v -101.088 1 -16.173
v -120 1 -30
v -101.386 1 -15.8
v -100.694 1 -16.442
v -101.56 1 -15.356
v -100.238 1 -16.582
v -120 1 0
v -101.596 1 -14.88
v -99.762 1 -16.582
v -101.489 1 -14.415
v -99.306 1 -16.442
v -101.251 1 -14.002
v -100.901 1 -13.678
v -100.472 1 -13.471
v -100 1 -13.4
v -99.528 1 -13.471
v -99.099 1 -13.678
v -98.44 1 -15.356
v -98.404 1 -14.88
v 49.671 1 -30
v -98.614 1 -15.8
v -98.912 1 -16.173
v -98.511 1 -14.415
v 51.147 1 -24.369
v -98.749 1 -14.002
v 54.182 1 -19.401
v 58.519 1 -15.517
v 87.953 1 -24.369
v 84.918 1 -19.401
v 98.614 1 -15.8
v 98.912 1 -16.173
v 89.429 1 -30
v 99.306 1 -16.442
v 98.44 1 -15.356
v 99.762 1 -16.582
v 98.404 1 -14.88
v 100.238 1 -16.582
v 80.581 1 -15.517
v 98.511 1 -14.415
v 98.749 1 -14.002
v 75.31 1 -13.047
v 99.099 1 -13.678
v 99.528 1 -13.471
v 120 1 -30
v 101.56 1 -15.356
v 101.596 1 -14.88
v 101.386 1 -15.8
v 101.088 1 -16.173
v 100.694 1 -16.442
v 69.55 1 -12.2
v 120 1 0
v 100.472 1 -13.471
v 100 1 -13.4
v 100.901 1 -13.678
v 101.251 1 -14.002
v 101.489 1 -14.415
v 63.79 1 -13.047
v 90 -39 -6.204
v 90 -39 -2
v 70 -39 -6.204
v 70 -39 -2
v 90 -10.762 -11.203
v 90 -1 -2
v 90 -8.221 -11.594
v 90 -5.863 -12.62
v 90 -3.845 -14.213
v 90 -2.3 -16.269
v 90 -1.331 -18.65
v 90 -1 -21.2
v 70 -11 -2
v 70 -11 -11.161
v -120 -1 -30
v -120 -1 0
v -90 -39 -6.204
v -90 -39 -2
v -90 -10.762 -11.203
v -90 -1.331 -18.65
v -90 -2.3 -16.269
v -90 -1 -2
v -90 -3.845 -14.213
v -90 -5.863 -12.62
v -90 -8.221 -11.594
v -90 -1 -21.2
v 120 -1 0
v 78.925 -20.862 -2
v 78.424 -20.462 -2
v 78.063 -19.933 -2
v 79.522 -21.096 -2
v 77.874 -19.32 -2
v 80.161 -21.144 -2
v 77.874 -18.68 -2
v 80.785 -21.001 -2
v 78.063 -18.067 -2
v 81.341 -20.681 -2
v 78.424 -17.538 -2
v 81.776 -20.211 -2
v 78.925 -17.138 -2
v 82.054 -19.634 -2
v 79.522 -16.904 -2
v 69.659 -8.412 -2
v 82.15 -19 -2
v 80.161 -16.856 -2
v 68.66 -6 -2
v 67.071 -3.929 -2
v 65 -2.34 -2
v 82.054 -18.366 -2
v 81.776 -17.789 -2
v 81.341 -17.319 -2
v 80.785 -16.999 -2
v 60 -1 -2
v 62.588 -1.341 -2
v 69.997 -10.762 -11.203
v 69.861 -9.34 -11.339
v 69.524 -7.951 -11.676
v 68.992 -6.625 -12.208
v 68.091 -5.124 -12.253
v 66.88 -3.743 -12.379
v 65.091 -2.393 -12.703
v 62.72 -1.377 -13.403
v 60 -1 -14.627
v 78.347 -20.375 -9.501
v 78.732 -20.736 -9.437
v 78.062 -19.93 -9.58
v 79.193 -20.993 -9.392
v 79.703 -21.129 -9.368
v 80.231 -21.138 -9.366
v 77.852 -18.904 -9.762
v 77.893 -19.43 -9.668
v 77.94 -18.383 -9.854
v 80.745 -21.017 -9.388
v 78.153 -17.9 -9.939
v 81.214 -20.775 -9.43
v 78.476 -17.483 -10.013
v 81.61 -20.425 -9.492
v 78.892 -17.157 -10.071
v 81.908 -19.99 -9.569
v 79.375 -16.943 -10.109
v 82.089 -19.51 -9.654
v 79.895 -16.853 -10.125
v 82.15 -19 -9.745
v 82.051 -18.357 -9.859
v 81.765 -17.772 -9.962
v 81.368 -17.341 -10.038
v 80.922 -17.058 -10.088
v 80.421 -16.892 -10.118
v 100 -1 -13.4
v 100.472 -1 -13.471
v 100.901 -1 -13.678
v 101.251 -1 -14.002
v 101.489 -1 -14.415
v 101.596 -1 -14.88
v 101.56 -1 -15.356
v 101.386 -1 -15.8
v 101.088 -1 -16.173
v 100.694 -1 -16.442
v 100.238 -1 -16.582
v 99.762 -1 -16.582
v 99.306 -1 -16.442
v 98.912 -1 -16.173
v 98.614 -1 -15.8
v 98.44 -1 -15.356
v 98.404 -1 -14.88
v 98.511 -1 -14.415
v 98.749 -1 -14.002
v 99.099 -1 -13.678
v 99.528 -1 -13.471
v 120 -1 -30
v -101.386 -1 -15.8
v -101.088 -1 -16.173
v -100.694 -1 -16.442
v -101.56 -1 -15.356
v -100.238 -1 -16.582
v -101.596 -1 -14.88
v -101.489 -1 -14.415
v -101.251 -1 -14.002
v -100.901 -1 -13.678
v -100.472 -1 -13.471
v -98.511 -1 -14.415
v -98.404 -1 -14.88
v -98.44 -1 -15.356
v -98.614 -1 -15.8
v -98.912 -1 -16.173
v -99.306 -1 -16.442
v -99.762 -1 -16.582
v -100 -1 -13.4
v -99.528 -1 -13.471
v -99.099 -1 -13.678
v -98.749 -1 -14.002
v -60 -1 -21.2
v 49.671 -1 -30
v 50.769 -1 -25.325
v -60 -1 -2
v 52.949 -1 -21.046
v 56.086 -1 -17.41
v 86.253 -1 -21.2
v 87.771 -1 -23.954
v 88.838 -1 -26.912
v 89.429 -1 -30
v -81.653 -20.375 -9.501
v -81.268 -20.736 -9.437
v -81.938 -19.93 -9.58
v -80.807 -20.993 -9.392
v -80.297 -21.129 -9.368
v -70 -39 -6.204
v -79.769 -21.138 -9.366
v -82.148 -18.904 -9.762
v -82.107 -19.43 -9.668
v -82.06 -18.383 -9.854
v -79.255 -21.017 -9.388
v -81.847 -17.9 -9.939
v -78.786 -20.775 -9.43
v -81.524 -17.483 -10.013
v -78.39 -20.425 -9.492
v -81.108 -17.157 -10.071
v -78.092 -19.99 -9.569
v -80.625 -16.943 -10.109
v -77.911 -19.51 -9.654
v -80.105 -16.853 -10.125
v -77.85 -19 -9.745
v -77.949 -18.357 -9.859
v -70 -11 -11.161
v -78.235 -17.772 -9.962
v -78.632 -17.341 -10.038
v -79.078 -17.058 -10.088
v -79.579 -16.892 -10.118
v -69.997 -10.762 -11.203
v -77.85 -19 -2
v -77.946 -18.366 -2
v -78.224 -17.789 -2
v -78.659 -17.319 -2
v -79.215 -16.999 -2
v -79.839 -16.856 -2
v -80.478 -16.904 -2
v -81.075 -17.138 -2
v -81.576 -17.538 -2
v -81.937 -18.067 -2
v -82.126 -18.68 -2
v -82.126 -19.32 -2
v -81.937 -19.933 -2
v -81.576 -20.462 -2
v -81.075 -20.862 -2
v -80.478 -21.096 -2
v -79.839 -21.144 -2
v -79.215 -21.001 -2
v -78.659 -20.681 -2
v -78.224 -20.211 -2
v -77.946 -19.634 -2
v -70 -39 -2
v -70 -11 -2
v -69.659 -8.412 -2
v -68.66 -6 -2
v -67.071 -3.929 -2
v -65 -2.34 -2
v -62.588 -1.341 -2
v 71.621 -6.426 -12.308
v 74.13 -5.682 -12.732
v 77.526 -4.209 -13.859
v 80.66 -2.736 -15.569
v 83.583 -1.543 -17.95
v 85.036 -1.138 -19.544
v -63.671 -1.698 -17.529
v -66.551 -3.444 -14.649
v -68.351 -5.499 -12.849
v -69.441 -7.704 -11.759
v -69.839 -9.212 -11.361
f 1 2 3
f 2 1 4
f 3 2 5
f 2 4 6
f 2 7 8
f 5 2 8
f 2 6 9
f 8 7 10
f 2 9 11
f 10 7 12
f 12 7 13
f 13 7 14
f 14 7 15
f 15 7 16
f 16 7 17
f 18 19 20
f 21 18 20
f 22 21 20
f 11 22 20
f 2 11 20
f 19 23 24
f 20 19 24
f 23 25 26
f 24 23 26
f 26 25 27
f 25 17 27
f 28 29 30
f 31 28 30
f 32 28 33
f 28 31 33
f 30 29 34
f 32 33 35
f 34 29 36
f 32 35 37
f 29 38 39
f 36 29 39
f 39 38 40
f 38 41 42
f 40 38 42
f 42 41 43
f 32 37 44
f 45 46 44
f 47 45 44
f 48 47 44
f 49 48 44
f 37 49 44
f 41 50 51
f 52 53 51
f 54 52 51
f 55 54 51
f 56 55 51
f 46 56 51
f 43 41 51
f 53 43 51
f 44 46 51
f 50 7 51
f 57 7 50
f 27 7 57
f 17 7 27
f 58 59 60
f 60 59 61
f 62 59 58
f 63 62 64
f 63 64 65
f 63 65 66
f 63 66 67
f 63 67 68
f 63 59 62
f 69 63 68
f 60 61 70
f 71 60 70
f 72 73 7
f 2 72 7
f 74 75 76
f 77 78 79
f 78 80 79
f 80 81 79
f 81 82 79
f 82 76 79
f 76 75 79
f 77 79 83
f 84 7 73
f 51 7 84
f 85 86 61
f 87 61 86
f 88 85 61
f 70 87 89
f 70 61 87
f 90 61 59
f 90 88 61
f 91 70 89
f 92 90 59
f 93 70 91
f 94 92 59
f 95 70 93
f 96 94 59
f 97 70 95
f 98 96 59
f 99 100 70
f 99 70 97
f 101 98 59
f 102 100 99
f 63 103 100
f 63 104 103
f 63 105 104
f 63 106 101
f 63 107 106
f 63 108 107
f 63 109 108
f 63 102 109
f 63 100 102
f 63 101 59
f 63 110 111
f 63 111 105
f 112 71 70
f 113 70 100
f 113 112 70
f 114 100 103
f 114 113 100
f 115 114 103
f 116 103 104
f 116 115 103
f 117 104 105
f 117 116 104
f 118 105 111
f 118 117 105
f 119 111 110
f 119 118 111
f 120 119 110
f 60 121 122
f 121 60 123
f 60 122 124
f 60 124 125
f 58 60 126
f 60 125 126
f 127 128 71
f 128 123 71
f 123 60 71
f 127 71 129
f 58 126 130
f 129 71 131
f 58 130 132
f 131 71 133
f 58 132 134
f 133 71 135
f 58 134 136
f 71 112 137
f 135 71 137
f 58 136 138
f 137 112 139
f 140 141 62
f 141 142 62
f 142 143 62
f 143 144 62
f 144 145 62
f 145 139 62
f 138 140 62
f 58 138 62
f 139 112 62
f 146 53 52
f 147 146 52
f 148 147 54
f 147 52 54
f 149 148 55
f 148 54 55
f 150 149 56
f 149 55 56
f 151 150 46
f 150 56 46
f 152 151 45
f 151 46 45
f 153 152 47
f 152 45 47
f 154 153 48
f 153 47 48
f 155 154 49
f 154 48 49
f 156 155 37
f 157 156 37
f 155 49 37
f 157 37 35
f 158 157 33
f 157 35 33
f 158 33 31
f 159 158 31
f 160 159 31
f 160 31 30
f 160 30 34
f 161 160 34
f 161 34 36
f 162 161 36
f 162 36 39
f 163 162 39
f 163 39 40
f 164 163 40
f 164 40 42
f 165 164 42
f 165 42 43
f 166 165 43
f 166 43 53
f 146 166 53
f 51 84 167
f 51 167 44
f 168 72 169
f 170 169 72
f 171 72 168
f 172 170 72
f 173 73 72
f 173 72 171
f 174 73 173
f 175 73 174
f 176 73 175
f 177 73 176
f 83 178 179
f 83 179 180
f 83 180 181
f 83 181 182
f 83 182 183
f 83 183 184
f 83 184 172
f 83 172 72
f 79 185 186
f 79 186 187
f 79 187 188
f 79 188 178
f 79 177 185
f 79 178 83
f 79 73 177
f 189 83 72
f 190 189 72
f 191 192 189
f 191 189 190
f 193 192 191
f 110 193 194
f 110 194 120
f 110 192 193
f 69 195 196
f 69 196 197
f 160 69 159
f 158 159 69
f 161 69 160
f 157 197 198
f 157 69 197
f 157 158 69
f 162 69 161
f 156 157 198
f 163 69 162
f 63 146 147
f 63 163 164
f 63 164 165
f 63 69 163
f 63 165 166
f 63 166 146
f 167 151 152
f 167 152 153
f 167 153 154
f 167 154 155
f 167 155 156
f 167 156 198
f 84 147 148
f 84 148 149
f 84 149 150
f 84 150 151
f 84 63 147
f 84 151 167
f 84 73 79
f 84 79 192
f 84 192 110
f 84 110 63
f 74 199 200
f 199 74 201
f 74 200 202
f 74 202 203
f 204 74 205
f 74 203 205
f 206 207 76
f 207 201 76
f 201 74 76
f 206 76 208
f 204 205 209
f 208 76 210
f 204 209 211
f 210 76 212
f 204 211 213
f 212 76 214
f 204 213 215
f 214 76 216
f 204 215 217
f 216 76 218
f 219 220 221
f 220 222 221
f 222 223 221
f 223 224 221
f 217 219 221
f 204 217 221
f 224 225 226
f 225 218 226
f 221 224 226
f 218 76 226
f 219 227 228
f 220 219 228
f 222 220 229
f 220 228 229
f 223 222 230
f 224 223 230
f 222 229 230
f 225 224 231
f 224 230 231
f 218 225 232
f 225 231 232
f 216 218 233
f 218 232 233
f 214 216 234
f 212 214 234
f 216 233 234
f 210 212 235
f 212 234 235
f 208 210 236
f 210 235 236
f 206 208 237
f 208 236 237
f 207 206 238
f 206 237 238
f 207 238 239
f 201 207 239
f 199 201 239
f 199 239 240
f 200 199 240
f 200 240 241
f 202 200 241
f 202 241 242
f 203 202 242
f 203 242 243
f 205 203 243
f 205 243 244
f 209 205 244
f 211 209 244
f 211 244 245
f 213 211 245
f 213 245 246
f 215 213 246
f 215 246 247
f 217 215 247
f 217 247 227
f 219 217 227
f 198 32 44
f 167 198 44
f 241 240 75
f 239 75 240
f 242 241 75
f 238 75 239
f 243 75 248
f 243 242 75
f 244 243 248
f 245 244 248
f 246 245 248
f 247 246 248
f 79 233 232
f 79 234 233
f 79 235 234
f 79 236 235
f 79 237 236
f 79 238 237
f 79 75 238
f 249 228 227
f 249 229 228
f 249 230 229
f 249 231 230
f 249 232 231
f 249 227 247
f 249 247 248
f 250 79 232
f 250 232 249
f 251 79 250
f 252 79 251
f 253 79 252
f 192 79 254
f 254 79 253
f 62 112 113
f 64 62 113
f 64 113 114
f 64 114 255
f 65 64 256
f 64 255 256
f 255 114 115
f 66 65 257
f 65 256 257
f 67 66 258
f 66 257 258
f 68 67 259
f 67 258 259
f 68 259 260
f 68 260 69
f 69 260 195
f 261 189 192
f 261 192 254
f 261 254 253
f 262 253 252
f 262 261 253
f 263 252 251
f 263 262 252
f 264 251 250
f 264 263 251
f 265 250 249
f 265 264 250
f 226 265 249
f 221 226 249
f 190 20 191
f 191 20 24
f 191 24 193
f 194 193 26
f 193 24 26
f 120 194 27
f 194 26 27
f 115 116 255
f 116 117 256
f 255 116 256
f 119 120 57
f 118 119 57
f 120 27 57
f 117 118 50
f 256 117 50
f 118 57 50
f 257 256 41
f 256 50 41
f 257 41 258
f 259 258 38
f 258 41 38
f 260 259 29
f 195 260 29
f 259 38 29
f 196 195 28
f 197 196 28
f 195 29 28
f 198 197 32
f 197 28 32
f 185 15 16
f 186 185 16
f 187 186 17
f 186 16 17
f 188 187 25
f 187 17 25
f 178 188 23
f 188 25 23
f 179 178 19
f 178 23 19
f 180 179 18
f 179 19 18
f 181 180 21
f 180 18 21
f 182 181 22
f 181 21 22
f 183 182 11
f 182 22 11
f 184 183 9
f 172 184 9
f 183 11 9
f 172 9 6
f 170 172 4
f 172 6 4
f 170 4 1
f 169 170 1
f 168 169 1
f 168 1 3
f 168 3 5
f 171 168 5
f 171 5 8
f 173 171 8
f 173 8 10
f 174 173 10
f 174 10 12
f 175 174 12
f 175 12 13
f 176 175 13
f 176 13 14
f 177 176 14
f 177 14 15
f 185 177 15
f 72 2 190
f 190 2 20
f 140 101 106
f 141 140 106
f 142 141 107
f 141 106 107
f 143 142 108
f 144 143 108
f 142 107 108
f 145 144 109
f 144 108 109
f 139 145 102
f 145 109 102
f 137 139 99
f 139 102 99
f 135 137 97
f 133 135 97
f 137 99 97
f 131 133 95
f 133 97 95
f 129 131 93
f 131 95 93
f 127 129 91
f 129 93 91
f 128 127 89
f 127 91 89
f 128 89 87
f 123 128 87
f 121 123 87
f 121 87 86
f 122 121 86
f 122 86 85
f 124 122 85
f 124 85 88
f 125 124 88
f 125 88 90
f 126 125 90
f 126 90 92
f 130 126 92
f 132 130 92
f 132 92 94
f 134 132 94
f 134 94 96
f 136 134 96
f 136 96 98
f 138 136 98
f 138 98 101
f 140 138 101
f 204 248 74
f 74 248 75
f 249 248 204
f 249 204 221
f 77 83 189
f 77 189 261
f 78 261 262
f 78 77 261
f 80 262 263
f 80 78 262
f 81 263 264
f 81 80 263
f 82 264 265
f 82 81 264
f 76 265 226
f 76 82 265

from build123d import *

# Parameters (mm, degrees)
ESQUISSE1_W             = 240
ESQUISSE1_H             = 2
BOSS_EXTRU_1_DEPTH      = 30
ESQUISSE1_3_W           = 180
ESQUISSE1_3_H           = 38
BOSS_EXTRU_2_DEPTH      = 1.2
ESQUISSE2_R             = 1.6
ENL_V_MAT_EXTRU_1_DEPTH = 131
ESQUISSE3_W             = 180
ESQUISSE3_H             = 38
BOSS_EXTRU_3_DEPTH      = 10
ESQUISSE4_W             = 180
ESQUISSE4_H             = 38
ENL_V_MAT_EXTRU_2_DEPTH = 2
ESQUISSE5_W             = 140
ESQUISSE5_H             = 38
ENL_V_MAT_EXTRU_3_DEPTH = 130.247823966
CONG_1_R                = 10
CHANFREIN1_START        = -21.049758641
CHANFREIN1_DEPTH        = 8.142458431
ESQUISSE6_R             = 2.15
ENL_V_MAT_EXTRU_4_DEPTH = 130.247823996
ESQUISSE9_R             = 20
ENL_V_MAT_EXTRU_6_DEPTH = 10


with BuildPart() as part:
    # Esquisse1 → Boss.-Extru.1 (new body)
    with BuildSketch(Plane.XY):
        Rectangle(ESQUISSE1_W, ESQUISSE1_H)
    extrude(amount=-BOSS_EXTRU_1_DEPTH)

    # Esquisse1<3> → Boss.-Extru.2 (add)
    with BuildSketch(Plane.XY):
        with Locations((0, -20)):
            Rectangle(ESQUISSE1_3_W, ESQUISSE1_3_H)
    extrude(amount=-BOSS_EXTRU_2_DEPTH)

    # Esquisse2 → Enlèv. mat.-Extru.1 (cut, through all)
    with BuildSketch(Plane(origin=(0, 1, 0), x_dir=(1, 0, 0), z_dir=(0, 1, 0))):
        with Locations(Location((-100, 15, 0), (0, 0, 270))):
            Circle(ESQUISSE2_R)
        with Locations(Location((100, 15, 0), (0, 0, 270))):
            Circle(ESQUISSE2_R)
    extrude(amount=-ENL_V_MAT_EXTRU_1_DEPTH, mode=Mode.SUBTRACT)

    # Esquisse3 → Boss.-Extru.3 (add)
    with BuildSketch(Plane(origin=(0, 0, -1.2), x_dir=(-1, 0, 0), z_dir=(0, 0, -1))):
        with Locations((0, -20)):
            Rectangle(ESQUISSE3_W, ESQUISSE3_H)
    extrude(amount=BOSS_EXTRU_3_DEPTH)

    # Esquisse4 → Enlèv. mat.-Extru.2 (cut)
    with BuildSketch(Plane.XY):
        with Locations((0, -20)):
            Rectangle(ESQUISSE4_W, ESQUISSE4_H)
    extrude(amount=-ENL_V_MAT_EXTRU_2_DEPTH, mode=Mode.SUBTRACT)

    # Esquisse5 → Enlèv. mat.-Extru.3 (cut, through all)
    with BuildSketch(Plane.XY.offset(-2)):
        with Locations((0, -20)):
            Rectangle(ESQUISSE5_W, ESQUISSE5_H)
    extrude(amount=-ENL_V_MAT_EXTRU_3_DEPTH, mode=Mode.SUBTRACT)

    # Congé1
    cong_1_edges = [part.edges().sort_by_distance(p)[0] for p in [
        (-80, -1, -11.2),
        (80, -1, -11.2),
        (70, -1, -6.6),
        (-70, -1, -6.6),
    ]]
    fillet(cong_1_edges, radius=CONG_1_R)

    # Chanfrein1: read off the stored shape, not the designer's step
    # Chanfrein1 outline → Chanfrein1 (cut)
    with BuildSketch(Plane(origin=(0, 0, 0), x_dir=(1, 0, 0), z_dir=(0, 0.17430886736371906, 0.9846910270528403)).offset(CHANFREIN1_START)):
        with BuildLine():
            Line((-70, -37.321496906), (-70, -8.886181431))
            add(Edge.make_bspline(
                [(-69.997176769, -8.644881308), (-70, -8.765514336), (-70, -8.886181431)],
                knots=[4.688626138, 4.688626138, 4.688626138, 4.71238898, 4.71238898, 4.71238898], degree=2, weights=[1, 0.999929417, 1]))
            Line((-69.997176769, -8.644881308), (-90, -8.644881308))
            Line((-90, -8.644881308), (-90, -37.321496906))
            Line((-90, -37.321496906), (-70, -37.321496906))
        make_face()
        with BuildLine():
            Line((90, -37.321496906), (90, -8.644881308))
            Line((90, -8.644881308), (69.997176769, -8.644881308))
            add(Edge.make_bspline(
                [(70, -8.886181431), (70, -8.765514336), (69.997176769, -8.644881308)],
                knots=[1.570796327, 1.570796327, 1.570796327, 1.59455917, 1.59455917, 1.59455917], degree=2, weights=[1, 0.999929417, 1]))
            Line((70, -8.886181431), (70, -37.321496906))
            Line((70, -37.321496906), (90, -37.321496906))
        make_face()
    extrude(amount=CHANFREIN1_DEPTH, mode=Mode.SUBTRACT)

    # Esquisse6 → Enlèv. mat.-Extru.4 (cut, through all)
    with BuildSketch(Plane.XY.offset(-2)):
        with Locations((80, -19)):
            Circle(ESQUISSE6_R)
        with Locations((-80, -19)):
            Circle(ESQUISSE6_R)
    extrude(amount=-ENL_V_MAT_EXTRU_4_DEPTH, mode=Mode.SUBTRACT)

    # Esquisse9 → Enlèv. mat.-Extru.6 (cut)
    with BuildSketch(Plane(origin=(0, 1, 0), x_dir=(1, 0, 0), z_dir=(0, 1, 0))):
        with Locations((69.55, 32.2)):
            Circle(ESQUISSE9_R)
    extrude(amount=-ENL_V_MAT_EXTRU_6_DEPTH, mode=Mode.SUBTRACT)


solid = part.part
